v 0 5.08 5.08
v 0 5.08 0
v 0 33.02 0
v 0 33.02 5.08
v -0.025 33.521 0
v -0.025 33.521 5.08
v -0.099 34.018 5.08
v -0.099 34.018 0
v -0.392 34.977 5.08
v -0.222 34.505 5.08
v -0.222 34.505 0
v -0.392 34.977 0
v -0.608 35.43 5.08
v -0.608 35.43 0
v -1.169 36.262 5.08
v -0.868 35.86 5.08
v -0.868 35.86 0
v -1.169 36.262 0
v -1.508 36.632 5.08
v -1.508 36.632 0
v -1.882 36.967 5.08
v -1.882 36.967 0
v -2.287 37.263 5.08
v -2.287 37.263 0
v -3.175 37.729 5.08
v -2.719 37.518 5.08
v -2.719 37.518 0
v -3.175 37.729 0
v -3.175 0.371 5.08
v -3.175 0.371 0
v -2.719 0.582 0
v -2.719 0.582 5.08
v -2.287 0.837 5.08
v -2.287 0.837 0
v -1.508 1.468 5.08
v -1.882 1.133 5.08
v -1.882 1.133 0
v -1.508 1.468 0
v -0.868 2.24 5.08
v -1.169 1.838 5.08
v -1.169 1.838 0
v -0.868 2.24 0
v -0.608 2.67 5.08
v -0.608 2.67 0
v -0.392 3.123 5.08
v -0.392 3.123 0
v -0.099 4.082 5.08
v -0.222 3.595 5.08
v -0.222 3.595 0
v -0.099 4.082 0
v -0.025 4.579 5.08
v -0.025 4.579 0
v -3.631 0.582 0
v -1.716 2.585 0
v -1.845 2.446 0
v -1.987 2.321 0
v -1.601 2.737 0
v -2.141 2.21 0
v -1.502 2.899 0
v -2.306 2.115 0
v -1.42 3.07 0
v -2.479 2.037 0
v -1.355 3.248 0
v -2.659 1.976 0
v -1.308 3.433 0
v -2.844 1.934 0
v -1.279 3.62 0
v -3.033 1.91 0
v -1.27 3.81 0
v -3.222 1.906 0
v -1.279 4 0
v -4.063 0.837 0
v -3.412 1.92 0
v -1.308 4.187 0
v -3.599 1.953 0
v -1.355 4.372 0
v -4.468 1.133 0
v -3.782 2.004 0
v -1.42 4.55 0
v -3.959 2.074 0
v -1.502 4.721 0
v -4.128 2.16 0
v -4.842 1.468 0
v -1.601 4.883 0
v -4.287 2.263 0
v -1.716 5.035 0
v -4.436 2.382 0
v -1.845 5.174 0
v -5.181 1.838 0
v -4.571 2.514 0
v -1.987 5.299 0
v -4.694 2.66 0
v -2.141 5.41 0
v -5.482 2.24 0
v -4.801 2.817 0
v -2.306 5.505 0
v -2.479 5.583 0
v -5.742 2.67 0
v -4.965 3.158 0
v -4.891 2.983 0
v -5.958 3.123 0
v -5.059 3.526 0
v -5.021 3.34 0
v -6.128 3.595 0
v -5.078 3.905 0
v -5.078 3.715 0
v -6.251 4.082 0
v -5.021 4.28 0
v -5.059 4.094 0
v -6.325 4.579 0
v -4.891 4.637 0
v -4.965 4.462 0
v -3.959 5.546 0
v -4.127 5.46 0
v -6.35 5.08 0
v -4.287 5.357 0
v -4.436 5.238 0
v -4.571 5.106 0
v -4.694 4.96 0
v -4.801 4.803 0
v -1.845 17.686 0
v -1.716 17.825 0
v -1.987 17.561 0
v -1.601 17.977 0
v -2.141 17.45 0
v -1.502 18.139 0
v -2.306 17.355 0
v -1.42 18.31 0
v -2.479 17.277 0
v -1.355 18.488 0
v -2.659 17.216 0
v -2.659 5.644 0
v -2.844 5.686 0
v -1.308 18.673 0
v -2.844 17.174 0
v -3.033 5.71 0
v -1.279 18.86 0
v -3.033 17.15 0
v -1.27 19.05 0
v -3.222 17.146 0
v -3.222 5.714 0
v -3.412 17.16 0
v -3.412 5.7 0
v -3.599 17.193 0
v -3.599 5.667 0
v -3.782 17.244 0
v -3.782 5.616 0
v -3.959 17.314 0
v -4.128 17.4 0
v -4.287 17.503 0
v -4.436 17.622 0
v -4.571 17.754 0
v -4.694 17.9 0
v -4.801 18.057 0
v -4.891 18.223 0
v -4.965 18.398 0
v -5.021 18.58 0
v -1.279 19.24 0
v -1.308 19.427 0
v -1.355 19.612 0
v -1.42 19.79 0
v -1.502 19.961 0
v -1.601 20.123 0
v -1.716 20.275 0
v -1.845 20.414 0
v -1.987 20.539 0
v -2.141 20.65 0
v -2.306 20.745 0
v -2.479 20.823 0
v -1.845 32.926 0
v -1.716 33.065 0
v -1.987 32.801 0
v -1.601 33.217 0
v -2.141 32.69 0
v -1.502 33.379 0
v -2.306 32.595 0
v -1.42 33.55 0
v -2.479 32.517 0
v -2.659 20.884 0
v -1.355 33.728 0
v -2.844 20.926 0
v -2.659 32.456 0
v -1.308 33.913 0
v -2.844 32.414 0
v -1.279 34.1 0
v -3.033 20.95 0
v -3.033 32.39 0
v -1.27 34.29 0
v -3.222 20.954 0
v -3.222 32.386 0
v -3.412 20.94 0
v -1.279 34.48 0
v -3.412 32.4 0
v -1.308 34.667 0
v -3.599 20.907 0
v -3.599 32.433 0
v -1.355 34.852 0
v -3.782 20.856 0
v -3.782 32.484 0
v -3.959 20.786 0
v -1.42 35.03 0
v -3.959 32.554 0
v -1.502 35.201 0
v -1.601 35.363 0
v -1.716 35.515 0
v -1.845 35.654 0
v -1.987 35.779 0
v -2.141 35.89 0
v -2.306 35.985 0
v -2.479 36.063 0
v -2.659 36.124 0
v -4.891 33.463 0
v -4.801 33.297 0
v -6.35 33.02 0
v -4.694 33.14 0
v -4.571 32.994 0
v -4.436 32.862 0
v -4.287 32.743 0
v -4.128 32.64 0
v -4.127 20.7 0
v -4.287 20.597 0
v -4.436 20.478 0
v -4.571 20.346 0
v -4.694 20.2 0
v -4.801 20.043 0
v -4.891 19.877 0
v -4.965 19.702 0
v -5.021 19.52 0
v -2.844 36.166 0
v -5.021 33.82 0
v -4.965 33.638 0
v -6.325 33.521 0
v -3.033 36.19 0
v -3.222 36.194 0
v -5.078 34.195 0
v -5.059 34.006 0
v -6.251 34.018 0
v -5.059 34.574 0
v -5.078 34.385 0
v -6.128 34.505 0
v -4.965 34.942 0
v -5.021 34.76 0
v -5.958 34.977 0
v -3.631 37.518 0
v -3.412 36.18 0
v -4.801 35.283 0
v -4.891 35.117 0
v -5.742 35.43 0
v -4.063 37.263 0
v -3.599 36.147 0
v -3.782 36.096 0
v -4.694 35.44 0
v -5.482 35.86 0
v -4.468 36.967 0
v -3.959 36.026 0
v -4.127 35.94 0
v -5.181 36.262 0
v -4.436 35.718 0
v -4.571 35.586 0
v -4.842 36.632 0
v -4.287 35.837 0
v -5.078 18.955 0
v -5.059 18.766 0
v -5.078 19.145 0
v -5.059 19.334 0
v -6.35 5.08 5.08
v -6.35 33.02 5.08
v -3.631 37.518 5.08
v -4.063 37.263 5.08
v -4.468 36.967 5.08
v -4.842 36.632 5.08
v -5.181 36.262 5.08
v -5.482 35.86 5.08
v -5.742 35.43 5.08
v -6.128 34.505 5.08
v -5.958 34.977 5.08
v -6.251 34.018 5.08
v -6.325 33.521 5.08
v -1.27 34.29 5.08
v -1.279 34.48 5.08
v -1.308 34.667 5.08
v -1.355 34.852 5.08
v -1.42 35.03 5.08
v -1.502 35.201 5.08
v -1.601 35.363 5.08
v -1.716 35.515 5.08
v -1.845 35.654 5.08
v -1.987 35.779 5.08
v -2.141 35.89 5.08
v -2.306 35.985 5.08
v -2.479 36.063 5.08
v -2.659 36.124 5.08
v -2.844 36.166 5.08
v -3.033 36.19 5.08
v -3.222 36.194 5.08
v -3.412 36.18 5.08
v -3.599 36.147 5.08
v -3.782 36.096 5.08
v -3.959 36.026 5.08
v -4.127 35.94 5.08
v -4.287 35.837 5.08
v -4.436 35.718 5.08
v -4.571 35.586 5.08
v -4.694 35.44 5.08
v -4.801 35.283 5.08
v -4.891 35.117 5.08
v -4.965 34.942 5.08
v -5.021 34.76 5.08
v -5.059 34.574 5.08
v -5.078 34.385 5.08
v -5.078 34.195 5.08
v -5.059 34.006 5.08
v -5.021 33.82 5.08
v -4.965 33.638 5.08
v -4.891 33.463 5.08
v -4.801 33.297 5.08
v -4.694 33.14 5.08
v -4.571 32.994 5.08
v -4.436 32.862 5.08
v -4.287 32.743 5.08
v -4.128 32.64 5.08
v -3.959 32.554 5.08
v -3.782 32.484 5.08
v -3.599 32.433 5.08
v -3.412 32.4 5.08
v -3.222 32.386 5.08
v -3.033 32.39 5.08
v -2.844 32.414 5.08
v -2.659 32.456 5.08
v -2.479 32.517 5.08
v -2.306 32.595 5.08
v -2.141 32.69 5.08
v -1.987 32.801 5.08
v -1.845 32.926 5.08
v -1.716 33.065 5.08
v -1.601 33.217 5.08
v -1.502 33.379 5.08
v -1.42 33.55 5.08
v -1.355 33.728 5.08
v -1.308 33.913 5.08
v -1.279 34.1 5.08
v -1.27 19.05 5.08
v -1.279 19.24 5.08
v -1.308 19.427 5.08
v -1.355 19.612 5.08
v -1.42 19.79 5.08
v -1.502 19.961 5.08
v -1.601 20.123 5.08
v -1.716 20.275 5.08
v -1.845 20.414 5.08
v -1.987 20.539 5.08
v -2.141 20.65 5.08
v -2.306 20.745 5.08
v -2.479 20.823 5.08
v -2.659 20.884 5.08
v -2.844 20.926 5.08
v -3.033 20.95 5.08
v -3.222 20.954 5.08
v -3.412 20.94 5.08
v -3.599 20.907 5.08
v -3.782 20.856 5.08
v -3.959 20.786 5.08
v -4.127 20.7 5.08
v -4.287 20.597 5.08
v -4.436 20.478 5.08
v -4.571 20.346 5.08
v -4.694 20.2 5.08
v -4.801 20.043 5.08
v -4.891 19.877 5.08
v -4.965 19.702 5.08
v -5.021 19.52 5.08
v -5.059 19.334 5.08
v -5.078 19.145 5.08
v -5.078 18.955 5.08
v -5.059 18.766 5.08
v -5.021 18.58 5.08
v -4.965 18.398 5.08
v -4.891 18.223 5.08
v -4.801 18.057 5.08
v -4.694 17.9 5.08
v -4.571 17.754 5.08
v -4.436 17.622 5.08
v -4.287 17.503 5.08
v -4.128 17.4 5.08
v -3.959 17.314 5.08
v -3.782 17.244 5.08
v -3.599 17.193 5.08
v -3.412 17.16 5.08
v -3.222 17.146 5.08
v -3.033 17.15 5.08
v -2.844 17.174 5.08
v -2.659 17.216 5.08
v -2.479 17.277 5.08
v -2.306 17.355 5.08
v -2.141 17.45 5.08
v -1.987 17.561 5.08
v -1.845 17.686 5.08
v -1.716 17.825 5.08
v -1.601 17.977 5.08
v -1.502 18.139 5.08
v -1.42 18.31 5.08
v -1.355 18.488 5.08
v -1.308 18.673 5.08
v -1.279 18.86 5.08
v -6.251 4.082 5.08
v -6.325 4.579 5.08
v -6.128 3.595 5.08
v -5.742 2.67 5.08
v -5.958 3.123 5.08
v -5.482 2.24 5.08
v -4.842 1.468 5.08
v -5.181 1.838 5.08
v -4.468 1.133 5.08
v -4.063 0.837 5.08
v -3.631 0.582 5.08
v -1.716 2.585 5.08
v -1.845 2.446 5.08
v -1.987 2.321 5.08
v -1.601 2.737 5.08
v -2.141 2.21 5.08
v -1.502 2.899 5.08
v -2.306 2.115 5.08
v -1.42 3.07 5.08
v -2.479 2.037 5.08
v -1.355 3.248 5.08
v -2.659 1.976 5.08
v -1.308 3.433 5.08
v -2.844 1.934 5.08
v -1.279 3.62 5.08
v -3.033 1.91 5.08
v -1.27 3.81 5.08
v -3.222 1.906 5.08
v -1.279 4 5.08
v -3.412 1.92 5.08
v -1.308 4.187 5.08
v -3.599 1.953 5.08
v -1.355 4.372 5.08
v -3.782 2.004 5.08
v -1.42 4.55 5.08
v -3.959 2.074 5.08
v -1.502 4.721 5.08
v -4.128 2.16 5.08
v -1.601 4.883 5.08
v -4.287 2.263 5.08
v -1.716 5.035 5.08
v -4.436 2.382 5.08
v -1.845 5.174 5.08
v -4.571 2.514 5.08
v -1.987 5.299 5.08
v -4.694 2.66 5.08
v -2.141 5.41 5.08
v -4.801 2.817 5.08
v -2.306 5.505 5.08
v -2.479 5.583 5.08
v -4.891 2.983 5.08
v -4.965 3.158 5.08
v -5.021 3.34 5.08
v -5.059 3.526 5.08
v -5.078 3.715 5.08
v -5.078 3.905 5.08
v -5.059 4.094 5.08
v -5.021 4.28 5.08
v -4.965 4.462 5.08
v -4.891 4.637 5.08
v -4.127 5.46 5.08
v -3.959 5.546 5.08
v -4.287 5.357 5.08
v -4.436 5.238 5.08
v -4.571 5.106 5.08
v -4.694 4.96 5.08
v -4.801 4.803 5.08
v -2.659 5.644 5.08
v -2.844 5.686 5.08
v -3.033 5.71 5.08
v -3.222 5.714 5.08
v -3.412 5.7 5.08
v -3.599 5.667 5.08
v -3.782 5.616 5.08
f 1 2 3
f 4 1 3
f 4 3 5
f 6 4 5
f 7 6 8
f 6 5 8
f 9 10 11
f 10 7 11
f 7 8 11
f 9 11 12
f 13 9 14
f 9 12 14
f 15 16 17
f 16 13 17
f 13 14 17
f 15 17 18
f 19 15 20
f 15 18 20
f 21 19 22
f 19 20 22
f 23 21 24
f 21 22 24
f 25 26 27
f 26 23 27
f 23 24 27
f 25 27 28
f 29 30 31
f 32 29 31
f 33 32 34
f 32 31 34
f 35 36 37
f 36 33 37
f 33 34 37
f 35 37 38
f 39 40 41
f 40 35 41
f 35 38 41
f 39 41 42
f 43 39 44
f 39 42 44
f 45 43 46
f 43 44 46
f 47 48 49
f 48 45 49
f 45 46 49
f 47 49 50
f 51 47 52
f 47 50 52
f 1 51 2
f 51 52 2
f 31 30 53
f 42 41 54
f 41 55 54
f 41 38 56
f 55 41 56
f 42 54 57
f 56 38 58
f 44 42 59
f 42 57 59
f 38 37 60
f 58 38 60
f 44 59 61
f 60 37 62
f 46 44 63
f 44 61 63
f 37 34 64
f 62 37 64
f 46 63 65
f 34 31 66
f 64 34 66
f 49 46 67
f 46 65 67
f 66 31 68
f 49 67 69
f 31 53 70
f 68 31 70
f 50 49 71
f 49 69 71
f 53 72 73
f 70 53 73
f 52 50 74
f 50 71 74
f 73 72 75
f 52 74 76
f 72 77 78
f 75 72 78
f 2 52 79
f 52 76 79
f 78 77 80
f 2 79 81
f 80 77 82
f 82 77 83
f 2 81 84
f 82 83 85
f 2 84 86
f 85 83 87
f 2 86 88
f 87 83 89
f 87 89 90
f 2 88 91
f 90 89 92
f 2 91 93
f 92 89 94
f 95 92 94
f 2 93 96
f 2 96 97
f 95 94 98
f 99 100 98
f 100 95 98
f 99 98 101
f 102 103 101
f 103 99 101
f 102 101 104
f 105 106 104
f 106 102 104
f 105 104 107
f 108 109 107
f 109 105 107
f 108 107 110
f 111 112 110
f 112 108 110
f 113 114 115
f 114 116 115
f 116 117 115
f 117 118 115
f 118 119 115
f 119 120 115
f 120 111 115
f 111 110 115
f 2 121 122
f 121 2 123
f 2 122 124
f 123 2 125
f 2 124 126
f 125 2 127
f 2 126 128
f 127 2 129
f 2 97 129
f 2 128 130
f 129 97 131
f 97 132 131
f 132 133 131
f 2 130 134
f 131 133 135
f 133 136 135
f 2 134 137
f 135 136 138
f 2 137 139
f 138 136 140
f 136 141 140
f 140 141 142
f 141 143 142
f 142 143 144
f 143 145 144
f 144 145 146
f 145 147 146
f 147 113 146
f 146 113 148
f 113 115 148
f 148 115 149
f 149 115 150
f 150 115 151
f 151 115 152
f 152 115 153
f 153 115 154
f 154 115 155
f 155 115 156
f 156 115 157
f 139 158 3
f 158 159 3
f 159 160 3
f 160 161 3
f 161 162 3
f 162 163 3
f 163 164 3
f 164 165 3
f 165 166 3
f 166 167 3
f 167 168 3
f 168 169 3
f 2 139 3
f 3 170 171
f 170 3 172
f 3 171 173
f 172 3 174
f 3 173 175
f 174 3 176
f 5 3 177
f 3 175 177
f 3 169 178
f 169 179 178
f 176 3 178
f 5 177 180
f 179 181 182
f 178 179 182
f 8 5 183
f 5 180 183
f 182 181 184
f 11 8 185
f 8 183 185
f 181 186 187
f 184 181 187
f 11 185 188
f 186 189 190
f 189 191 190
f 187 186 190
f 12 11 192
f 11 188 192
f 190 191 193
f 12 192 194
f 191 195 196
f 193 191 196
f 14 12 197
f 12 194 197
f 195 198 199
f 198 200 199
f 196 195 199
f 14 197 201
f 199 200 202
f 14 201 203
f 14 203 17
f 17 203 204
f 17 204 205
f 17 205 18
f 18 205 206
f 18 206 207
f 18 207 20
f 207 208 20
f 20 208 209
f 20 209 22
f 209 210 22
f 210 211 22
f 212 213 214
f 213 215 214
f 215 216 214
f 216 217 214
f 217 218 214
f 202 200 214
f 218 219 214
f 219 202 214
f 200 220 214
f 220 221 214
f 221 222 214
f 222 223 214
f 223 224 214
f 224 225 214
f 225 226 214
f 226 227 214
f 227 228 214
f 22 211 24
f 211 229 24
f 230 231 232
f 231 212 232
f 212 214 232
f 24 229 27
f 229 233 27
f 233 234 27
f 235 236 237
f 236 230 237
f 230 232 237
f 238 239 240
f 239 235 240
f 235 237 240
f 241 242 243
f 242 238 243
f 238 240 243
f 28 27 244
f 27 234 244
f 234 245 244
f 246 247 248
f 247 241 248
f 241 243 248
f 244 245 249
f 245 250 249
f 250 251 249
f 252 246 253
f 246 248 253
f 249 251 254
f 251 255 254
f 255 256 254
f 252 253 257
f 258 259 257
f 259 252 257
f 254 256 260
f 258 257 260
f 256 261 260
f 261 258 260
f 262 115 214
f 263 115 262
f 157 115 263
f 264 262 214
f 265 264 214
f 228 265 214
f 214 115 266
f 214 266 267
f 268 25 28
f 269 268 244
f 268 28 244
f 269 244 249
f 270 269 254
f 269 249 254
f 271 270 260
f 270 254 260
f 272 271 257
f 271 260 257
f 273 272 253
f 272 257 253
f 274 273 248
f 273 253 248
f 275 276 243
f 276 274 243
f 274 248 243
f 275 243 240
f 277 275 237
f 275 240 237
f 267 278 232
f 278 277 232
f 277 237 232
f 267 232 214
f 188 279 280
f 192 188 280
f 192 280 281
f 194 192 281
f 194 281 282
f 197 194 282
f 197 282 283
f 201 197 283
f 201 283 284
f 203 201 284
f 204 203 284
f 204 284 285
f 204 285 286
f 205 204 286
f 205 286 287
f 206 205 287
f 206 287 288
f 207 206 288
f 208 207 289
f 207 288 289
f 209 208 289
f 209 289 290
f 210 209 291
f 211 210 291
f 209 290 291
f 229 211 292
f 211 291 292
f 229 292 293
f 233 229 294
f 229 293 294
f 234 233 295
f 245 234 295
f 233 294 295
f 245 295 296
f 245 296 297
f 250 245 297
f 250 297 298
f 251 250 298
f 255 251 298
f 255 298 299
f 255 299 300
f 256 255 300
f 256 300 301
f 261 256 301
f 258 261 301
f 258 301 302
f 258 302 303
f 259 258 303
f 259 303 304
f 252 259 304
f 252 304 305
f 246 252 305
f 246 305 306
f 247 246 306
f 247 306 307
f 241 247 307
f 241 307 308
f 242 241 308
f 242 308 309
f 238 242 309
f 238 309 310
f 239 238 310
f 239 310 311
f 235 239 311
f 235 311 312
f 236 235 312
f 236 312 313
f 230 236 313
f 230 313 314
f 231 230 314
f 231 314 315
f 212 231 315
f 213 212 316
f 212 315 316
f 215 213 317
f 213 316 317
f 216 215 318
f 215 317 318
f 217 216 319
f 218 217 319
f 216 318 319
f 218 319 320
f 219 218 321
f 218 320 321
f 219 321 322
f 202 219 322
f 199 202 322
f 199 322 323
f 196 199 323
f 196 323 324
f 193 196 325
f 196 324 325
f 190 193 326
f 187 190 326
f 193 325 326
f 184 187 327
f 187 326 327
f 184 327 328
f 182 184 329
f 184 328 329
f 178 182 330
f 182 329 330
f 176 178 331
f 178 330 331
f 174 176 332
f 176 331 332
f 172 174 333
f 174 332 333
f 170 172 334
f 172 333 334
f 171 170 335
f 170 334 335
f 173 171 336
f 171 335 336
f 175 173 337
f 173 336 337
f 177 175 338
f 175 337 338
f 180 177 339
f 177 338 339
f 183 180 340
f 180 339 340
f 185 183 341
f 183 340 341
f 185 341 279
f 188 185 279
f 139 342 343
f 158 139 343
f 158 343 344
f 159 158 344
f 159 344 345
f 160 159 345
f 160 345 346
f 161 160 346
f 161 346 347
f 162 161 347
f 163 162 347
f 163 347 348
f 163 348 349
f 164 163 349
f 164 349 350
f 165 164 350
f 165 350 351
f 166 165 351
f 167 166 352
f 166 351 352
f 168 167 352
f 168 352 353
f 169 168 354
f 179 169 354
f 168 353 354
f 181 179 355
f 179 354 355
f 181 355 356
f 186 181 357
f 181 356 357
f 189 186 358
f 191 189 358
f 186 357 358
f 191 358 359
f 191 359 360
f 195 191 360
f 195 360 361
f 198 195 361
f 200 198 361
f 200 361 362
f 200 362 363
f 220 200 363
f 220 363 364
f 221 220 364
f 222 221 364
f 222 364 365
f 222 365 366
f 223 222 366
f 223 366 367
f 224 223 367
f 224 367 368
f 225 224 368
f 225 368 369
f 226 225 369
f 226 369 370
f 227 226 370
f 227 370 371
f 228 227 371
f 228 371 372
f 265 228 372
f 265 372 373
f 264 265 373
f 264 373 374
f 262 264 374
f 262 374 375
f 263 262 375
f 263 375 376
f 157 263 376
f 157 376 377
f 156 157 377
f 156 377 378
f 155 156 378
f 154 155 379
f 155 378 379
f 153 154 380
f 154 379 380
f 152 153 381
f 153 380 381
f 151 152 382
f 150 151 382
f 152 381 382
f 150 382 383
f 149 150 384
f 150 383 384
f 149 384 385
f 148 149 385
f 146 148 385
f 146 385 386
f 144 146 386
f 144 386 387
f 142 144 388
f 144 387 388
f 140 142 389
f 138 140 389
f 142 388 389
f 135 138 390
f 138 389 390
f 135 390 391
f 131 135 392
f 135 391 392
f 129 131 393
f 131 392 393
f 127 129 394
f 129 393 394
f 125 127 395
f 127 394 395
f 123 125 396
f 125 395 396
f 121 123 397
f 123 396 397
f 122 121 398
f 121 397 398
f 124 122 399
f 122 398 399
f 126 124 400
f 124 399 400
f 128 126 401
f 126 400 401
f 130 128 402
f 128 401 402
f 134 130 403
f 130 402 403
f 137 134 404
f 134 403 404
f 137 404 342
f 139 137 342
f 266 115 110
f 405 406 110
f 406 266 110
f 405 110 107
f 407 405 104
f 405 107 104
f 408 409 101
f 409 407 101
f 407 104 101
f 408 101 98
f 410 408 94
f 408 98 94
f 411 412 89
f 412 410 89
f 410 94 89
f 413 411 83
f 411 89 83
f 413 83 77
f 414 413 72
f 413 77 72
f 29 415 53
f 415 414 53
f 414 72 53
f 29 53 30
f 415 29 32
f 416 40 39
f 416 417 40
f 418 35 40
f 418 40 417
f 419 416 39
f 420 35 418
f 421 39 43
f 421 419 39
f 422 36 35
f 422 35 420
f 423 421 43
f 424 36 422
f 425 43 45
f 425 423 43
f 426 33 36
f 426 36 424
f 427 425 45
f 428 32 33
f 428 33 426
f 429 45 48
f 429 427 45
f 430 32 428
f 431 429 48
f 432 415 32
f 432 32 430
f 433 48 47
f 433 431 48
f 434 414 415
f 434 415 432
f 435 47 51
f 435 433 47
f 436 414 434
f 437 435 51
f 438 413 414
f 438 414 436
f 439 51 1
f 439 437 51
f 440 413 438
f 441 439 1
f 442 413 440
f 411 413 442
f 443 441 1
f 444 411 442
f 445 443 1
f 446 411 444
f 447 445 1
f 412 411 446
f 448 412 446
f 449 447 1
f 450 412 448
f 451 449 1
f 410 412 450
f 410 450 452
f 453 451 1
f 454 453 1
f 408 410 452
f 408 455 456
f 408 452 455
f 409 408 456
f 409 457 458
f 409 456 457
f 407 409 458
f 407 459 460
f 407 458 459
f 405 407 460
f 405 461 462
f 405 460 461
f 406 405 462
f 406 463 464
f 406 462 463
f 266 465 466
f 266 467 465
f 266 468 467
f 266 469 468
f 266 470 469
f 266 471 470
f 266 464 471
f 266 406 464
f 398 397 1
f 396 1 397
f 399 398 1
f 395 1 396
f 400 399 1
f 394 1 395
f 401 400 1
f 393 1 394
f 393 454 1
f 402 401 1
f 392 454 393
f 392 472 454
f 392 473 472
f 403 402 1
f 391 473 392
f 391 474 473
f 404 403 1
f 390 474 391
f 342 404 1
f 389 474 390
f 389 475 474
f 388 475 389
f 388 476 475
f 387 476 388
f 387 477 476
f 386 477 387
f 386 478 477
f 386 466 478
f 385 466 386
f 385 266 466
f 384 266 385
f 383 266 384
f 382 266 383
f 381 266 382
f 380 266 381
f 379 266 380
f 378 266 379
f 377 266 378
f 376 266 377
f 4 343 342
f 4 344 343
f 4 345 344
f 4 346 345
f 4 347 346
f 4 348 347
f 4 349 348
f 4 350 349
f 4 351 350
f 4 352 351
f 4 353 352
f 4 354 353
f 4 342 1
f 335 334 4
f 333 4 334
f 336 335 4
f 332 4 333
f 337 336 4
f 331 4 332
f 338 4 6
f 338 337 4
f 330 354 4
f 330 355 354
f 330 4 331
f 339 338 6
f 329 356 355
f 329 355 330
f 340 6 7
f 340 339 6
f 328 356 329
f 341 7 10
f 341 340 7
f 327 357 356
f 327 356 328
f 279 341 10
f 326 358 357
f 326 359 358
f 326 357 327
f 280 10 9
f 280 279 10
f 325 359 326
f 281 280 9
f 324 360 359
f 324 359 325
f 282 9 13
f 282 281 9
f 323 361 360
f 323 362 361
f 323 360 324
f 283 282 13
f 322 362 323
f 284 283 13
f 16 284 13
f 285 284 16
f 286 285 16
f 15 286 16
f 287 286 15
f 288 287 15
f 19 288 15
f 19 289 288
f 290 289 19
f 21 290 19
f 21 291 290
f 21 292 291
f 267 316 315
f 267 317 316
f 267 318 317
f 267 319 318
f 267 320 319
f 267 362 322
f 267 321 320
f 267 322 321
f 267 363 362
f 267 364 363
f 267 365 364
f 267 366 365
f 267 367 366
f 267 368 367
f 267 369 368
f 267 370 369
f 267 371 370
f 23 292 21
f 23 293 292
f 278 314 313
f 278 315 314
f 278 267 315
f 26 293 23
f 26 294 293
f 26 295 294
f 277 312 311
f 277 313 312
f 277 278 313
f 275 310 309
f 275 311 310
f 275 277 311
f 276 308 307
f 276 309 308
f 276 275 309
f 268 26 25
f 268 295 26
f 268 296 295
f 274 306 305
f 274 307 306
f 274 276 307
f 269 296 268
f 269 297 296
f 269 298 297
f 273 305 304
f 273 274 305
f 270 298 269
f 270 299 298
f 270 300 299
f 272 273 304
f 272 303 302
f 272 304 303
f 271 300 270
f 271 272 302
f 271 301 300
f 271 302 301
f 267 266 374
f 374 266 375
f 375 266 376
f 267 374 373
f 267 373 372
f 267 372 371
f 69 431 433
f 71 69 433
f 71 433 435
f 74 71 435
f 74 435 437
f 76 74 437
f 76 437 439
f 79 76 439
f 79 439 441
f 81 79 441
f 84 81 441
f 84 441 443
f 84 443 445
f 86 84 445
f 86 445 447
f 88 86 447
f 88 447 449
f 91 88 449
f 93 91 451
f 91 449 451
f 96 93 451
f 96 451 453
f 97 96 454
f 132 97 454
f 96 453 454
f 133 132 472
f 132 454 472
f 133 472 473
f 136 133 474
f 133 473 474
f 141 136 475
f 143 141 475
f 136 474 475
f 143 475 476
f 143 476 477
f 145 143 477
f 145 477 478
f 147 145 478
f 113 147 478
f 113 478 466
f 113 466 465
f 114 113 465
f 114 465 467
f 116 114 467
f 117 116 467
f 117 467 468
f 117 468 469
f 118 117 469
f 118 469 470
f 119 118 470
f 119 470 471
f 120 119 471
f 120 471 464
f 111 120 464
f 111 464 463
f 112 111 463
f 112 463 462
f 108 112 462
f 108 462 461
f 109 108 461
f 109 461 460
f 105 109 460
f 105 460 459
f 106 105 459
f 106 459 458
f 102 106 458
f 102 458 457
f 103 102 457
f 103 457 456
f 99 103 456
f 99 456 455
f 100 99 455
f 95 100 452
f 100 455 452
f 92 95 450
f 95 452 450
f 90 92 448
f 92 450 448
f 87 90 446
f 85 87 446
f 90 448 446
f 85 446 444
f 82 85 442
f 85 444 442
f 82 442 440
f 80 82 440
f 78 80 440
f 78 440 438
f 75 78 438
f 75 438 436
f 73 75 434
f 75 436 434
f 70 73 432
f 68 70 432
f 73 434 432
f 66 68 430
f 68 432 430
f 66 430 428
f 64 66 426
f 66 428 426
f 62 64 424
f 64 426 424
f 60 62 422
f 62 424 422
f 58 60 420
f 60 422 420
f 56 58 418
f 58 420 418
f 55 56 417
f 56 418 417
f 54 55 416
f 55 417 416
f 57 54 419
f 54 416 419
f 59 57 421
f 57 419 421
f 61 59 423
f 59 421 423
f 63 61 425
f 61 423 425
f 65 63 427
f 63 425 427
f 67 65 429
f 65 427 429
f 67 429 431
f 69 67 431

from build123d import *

# Parameters (mm, degrees)
SKETCH3_W           = 38.1
SKETCH3_H           = 6.35
BOSS_EXTRUDE1_DEPTH = 5.08
SKETCH4_R           = 1.905
CUT_EXTRUDE1_DEPTH  = 39.958168591
FILLET2_R           = 5.08


with BuildPart() as part:
    # Sketch3 → Boss-Extrude1 (new body)
    with BuildSketch(Plane(origin=(0, 0, 0), x_dir=(0, 1, 0), z_dir=(0, 0, 1))):
        with Locations((19.05, 3.175)):
            Rectangle(SKETCH3_W, SKETCH3_H)
    extrude(amount=BOSS_EXTRUDE1_DEPTH)

    # Sketch4 → Cut-Extrude1 (cut, through all)
    with BuildSketch(Plane(origin=(0, 0, 5.08), x_dir=(0, -1, 0), z_dir=(0, 0, 1))):
        with Locations(Location((-3.81, -3.175, 0), (0, 0, 90))):
            Circle(SKETCH4_R)
        with Locations(Location((-19.05, -3.175, 0), (0, 0, 90))):
            Circle(SKETCH4_R)
        with Locations(Location((-34.29, -3.175, 0), (0, 0, 90))):
            Circle(SKETCH4_R)
    extrude(amount=-CUT_EXTRUDE1_DEPTH, mode=Mode.SUBTRACT)

    # Fillet2
    # the kernel refuses this fillet: 5.08 mm, written as the material it takes off along each edge
    with BuildSketch(Plane(origin=(0, 38.1, -12.7), x_dir=(0, -1, 0), z_dir=(0, 0, 1)), Plane(origin=(-6.35, 38.1, -12.7), x_dir=(1, 0, 0), z_dir=(0, 0, 1))) as fillet2_piece_1:
        with BuildLine():
            CenterArc((FILLET2_R, -FILLET2_R), FILLET2_R, 90, 90)
            Line((0, -FILLET2_R), (0, 0))
            Line((0, 0), (FILLET2_R, 0))
        make_face()
    extrude(amount=30.48, mode=Mode.SUBTRACT)
    with BuildSketch(Plane(origin=(0, 0, -12.7), x_dir=(0, 1, 0), z_dir=(0, 0, 1)), Plane(origin=(-6.35, 0, -12.7), x_dir=(1, 0, 0), z_dir=(0, 0, 1))) as fillet2_piece_2:
        with BuildLine():
            CenterArc((FILLET2_R, FILLET2_R), FILLET2_R, 180, 90)
            Line((0, FILLET2_R), (0, 0))
            Line((0, 0), (FILLET2_R, 0))
        make_face()
    extrude(amount=30.48, mode=Mode.SUBTRACT)


solid = part.part
